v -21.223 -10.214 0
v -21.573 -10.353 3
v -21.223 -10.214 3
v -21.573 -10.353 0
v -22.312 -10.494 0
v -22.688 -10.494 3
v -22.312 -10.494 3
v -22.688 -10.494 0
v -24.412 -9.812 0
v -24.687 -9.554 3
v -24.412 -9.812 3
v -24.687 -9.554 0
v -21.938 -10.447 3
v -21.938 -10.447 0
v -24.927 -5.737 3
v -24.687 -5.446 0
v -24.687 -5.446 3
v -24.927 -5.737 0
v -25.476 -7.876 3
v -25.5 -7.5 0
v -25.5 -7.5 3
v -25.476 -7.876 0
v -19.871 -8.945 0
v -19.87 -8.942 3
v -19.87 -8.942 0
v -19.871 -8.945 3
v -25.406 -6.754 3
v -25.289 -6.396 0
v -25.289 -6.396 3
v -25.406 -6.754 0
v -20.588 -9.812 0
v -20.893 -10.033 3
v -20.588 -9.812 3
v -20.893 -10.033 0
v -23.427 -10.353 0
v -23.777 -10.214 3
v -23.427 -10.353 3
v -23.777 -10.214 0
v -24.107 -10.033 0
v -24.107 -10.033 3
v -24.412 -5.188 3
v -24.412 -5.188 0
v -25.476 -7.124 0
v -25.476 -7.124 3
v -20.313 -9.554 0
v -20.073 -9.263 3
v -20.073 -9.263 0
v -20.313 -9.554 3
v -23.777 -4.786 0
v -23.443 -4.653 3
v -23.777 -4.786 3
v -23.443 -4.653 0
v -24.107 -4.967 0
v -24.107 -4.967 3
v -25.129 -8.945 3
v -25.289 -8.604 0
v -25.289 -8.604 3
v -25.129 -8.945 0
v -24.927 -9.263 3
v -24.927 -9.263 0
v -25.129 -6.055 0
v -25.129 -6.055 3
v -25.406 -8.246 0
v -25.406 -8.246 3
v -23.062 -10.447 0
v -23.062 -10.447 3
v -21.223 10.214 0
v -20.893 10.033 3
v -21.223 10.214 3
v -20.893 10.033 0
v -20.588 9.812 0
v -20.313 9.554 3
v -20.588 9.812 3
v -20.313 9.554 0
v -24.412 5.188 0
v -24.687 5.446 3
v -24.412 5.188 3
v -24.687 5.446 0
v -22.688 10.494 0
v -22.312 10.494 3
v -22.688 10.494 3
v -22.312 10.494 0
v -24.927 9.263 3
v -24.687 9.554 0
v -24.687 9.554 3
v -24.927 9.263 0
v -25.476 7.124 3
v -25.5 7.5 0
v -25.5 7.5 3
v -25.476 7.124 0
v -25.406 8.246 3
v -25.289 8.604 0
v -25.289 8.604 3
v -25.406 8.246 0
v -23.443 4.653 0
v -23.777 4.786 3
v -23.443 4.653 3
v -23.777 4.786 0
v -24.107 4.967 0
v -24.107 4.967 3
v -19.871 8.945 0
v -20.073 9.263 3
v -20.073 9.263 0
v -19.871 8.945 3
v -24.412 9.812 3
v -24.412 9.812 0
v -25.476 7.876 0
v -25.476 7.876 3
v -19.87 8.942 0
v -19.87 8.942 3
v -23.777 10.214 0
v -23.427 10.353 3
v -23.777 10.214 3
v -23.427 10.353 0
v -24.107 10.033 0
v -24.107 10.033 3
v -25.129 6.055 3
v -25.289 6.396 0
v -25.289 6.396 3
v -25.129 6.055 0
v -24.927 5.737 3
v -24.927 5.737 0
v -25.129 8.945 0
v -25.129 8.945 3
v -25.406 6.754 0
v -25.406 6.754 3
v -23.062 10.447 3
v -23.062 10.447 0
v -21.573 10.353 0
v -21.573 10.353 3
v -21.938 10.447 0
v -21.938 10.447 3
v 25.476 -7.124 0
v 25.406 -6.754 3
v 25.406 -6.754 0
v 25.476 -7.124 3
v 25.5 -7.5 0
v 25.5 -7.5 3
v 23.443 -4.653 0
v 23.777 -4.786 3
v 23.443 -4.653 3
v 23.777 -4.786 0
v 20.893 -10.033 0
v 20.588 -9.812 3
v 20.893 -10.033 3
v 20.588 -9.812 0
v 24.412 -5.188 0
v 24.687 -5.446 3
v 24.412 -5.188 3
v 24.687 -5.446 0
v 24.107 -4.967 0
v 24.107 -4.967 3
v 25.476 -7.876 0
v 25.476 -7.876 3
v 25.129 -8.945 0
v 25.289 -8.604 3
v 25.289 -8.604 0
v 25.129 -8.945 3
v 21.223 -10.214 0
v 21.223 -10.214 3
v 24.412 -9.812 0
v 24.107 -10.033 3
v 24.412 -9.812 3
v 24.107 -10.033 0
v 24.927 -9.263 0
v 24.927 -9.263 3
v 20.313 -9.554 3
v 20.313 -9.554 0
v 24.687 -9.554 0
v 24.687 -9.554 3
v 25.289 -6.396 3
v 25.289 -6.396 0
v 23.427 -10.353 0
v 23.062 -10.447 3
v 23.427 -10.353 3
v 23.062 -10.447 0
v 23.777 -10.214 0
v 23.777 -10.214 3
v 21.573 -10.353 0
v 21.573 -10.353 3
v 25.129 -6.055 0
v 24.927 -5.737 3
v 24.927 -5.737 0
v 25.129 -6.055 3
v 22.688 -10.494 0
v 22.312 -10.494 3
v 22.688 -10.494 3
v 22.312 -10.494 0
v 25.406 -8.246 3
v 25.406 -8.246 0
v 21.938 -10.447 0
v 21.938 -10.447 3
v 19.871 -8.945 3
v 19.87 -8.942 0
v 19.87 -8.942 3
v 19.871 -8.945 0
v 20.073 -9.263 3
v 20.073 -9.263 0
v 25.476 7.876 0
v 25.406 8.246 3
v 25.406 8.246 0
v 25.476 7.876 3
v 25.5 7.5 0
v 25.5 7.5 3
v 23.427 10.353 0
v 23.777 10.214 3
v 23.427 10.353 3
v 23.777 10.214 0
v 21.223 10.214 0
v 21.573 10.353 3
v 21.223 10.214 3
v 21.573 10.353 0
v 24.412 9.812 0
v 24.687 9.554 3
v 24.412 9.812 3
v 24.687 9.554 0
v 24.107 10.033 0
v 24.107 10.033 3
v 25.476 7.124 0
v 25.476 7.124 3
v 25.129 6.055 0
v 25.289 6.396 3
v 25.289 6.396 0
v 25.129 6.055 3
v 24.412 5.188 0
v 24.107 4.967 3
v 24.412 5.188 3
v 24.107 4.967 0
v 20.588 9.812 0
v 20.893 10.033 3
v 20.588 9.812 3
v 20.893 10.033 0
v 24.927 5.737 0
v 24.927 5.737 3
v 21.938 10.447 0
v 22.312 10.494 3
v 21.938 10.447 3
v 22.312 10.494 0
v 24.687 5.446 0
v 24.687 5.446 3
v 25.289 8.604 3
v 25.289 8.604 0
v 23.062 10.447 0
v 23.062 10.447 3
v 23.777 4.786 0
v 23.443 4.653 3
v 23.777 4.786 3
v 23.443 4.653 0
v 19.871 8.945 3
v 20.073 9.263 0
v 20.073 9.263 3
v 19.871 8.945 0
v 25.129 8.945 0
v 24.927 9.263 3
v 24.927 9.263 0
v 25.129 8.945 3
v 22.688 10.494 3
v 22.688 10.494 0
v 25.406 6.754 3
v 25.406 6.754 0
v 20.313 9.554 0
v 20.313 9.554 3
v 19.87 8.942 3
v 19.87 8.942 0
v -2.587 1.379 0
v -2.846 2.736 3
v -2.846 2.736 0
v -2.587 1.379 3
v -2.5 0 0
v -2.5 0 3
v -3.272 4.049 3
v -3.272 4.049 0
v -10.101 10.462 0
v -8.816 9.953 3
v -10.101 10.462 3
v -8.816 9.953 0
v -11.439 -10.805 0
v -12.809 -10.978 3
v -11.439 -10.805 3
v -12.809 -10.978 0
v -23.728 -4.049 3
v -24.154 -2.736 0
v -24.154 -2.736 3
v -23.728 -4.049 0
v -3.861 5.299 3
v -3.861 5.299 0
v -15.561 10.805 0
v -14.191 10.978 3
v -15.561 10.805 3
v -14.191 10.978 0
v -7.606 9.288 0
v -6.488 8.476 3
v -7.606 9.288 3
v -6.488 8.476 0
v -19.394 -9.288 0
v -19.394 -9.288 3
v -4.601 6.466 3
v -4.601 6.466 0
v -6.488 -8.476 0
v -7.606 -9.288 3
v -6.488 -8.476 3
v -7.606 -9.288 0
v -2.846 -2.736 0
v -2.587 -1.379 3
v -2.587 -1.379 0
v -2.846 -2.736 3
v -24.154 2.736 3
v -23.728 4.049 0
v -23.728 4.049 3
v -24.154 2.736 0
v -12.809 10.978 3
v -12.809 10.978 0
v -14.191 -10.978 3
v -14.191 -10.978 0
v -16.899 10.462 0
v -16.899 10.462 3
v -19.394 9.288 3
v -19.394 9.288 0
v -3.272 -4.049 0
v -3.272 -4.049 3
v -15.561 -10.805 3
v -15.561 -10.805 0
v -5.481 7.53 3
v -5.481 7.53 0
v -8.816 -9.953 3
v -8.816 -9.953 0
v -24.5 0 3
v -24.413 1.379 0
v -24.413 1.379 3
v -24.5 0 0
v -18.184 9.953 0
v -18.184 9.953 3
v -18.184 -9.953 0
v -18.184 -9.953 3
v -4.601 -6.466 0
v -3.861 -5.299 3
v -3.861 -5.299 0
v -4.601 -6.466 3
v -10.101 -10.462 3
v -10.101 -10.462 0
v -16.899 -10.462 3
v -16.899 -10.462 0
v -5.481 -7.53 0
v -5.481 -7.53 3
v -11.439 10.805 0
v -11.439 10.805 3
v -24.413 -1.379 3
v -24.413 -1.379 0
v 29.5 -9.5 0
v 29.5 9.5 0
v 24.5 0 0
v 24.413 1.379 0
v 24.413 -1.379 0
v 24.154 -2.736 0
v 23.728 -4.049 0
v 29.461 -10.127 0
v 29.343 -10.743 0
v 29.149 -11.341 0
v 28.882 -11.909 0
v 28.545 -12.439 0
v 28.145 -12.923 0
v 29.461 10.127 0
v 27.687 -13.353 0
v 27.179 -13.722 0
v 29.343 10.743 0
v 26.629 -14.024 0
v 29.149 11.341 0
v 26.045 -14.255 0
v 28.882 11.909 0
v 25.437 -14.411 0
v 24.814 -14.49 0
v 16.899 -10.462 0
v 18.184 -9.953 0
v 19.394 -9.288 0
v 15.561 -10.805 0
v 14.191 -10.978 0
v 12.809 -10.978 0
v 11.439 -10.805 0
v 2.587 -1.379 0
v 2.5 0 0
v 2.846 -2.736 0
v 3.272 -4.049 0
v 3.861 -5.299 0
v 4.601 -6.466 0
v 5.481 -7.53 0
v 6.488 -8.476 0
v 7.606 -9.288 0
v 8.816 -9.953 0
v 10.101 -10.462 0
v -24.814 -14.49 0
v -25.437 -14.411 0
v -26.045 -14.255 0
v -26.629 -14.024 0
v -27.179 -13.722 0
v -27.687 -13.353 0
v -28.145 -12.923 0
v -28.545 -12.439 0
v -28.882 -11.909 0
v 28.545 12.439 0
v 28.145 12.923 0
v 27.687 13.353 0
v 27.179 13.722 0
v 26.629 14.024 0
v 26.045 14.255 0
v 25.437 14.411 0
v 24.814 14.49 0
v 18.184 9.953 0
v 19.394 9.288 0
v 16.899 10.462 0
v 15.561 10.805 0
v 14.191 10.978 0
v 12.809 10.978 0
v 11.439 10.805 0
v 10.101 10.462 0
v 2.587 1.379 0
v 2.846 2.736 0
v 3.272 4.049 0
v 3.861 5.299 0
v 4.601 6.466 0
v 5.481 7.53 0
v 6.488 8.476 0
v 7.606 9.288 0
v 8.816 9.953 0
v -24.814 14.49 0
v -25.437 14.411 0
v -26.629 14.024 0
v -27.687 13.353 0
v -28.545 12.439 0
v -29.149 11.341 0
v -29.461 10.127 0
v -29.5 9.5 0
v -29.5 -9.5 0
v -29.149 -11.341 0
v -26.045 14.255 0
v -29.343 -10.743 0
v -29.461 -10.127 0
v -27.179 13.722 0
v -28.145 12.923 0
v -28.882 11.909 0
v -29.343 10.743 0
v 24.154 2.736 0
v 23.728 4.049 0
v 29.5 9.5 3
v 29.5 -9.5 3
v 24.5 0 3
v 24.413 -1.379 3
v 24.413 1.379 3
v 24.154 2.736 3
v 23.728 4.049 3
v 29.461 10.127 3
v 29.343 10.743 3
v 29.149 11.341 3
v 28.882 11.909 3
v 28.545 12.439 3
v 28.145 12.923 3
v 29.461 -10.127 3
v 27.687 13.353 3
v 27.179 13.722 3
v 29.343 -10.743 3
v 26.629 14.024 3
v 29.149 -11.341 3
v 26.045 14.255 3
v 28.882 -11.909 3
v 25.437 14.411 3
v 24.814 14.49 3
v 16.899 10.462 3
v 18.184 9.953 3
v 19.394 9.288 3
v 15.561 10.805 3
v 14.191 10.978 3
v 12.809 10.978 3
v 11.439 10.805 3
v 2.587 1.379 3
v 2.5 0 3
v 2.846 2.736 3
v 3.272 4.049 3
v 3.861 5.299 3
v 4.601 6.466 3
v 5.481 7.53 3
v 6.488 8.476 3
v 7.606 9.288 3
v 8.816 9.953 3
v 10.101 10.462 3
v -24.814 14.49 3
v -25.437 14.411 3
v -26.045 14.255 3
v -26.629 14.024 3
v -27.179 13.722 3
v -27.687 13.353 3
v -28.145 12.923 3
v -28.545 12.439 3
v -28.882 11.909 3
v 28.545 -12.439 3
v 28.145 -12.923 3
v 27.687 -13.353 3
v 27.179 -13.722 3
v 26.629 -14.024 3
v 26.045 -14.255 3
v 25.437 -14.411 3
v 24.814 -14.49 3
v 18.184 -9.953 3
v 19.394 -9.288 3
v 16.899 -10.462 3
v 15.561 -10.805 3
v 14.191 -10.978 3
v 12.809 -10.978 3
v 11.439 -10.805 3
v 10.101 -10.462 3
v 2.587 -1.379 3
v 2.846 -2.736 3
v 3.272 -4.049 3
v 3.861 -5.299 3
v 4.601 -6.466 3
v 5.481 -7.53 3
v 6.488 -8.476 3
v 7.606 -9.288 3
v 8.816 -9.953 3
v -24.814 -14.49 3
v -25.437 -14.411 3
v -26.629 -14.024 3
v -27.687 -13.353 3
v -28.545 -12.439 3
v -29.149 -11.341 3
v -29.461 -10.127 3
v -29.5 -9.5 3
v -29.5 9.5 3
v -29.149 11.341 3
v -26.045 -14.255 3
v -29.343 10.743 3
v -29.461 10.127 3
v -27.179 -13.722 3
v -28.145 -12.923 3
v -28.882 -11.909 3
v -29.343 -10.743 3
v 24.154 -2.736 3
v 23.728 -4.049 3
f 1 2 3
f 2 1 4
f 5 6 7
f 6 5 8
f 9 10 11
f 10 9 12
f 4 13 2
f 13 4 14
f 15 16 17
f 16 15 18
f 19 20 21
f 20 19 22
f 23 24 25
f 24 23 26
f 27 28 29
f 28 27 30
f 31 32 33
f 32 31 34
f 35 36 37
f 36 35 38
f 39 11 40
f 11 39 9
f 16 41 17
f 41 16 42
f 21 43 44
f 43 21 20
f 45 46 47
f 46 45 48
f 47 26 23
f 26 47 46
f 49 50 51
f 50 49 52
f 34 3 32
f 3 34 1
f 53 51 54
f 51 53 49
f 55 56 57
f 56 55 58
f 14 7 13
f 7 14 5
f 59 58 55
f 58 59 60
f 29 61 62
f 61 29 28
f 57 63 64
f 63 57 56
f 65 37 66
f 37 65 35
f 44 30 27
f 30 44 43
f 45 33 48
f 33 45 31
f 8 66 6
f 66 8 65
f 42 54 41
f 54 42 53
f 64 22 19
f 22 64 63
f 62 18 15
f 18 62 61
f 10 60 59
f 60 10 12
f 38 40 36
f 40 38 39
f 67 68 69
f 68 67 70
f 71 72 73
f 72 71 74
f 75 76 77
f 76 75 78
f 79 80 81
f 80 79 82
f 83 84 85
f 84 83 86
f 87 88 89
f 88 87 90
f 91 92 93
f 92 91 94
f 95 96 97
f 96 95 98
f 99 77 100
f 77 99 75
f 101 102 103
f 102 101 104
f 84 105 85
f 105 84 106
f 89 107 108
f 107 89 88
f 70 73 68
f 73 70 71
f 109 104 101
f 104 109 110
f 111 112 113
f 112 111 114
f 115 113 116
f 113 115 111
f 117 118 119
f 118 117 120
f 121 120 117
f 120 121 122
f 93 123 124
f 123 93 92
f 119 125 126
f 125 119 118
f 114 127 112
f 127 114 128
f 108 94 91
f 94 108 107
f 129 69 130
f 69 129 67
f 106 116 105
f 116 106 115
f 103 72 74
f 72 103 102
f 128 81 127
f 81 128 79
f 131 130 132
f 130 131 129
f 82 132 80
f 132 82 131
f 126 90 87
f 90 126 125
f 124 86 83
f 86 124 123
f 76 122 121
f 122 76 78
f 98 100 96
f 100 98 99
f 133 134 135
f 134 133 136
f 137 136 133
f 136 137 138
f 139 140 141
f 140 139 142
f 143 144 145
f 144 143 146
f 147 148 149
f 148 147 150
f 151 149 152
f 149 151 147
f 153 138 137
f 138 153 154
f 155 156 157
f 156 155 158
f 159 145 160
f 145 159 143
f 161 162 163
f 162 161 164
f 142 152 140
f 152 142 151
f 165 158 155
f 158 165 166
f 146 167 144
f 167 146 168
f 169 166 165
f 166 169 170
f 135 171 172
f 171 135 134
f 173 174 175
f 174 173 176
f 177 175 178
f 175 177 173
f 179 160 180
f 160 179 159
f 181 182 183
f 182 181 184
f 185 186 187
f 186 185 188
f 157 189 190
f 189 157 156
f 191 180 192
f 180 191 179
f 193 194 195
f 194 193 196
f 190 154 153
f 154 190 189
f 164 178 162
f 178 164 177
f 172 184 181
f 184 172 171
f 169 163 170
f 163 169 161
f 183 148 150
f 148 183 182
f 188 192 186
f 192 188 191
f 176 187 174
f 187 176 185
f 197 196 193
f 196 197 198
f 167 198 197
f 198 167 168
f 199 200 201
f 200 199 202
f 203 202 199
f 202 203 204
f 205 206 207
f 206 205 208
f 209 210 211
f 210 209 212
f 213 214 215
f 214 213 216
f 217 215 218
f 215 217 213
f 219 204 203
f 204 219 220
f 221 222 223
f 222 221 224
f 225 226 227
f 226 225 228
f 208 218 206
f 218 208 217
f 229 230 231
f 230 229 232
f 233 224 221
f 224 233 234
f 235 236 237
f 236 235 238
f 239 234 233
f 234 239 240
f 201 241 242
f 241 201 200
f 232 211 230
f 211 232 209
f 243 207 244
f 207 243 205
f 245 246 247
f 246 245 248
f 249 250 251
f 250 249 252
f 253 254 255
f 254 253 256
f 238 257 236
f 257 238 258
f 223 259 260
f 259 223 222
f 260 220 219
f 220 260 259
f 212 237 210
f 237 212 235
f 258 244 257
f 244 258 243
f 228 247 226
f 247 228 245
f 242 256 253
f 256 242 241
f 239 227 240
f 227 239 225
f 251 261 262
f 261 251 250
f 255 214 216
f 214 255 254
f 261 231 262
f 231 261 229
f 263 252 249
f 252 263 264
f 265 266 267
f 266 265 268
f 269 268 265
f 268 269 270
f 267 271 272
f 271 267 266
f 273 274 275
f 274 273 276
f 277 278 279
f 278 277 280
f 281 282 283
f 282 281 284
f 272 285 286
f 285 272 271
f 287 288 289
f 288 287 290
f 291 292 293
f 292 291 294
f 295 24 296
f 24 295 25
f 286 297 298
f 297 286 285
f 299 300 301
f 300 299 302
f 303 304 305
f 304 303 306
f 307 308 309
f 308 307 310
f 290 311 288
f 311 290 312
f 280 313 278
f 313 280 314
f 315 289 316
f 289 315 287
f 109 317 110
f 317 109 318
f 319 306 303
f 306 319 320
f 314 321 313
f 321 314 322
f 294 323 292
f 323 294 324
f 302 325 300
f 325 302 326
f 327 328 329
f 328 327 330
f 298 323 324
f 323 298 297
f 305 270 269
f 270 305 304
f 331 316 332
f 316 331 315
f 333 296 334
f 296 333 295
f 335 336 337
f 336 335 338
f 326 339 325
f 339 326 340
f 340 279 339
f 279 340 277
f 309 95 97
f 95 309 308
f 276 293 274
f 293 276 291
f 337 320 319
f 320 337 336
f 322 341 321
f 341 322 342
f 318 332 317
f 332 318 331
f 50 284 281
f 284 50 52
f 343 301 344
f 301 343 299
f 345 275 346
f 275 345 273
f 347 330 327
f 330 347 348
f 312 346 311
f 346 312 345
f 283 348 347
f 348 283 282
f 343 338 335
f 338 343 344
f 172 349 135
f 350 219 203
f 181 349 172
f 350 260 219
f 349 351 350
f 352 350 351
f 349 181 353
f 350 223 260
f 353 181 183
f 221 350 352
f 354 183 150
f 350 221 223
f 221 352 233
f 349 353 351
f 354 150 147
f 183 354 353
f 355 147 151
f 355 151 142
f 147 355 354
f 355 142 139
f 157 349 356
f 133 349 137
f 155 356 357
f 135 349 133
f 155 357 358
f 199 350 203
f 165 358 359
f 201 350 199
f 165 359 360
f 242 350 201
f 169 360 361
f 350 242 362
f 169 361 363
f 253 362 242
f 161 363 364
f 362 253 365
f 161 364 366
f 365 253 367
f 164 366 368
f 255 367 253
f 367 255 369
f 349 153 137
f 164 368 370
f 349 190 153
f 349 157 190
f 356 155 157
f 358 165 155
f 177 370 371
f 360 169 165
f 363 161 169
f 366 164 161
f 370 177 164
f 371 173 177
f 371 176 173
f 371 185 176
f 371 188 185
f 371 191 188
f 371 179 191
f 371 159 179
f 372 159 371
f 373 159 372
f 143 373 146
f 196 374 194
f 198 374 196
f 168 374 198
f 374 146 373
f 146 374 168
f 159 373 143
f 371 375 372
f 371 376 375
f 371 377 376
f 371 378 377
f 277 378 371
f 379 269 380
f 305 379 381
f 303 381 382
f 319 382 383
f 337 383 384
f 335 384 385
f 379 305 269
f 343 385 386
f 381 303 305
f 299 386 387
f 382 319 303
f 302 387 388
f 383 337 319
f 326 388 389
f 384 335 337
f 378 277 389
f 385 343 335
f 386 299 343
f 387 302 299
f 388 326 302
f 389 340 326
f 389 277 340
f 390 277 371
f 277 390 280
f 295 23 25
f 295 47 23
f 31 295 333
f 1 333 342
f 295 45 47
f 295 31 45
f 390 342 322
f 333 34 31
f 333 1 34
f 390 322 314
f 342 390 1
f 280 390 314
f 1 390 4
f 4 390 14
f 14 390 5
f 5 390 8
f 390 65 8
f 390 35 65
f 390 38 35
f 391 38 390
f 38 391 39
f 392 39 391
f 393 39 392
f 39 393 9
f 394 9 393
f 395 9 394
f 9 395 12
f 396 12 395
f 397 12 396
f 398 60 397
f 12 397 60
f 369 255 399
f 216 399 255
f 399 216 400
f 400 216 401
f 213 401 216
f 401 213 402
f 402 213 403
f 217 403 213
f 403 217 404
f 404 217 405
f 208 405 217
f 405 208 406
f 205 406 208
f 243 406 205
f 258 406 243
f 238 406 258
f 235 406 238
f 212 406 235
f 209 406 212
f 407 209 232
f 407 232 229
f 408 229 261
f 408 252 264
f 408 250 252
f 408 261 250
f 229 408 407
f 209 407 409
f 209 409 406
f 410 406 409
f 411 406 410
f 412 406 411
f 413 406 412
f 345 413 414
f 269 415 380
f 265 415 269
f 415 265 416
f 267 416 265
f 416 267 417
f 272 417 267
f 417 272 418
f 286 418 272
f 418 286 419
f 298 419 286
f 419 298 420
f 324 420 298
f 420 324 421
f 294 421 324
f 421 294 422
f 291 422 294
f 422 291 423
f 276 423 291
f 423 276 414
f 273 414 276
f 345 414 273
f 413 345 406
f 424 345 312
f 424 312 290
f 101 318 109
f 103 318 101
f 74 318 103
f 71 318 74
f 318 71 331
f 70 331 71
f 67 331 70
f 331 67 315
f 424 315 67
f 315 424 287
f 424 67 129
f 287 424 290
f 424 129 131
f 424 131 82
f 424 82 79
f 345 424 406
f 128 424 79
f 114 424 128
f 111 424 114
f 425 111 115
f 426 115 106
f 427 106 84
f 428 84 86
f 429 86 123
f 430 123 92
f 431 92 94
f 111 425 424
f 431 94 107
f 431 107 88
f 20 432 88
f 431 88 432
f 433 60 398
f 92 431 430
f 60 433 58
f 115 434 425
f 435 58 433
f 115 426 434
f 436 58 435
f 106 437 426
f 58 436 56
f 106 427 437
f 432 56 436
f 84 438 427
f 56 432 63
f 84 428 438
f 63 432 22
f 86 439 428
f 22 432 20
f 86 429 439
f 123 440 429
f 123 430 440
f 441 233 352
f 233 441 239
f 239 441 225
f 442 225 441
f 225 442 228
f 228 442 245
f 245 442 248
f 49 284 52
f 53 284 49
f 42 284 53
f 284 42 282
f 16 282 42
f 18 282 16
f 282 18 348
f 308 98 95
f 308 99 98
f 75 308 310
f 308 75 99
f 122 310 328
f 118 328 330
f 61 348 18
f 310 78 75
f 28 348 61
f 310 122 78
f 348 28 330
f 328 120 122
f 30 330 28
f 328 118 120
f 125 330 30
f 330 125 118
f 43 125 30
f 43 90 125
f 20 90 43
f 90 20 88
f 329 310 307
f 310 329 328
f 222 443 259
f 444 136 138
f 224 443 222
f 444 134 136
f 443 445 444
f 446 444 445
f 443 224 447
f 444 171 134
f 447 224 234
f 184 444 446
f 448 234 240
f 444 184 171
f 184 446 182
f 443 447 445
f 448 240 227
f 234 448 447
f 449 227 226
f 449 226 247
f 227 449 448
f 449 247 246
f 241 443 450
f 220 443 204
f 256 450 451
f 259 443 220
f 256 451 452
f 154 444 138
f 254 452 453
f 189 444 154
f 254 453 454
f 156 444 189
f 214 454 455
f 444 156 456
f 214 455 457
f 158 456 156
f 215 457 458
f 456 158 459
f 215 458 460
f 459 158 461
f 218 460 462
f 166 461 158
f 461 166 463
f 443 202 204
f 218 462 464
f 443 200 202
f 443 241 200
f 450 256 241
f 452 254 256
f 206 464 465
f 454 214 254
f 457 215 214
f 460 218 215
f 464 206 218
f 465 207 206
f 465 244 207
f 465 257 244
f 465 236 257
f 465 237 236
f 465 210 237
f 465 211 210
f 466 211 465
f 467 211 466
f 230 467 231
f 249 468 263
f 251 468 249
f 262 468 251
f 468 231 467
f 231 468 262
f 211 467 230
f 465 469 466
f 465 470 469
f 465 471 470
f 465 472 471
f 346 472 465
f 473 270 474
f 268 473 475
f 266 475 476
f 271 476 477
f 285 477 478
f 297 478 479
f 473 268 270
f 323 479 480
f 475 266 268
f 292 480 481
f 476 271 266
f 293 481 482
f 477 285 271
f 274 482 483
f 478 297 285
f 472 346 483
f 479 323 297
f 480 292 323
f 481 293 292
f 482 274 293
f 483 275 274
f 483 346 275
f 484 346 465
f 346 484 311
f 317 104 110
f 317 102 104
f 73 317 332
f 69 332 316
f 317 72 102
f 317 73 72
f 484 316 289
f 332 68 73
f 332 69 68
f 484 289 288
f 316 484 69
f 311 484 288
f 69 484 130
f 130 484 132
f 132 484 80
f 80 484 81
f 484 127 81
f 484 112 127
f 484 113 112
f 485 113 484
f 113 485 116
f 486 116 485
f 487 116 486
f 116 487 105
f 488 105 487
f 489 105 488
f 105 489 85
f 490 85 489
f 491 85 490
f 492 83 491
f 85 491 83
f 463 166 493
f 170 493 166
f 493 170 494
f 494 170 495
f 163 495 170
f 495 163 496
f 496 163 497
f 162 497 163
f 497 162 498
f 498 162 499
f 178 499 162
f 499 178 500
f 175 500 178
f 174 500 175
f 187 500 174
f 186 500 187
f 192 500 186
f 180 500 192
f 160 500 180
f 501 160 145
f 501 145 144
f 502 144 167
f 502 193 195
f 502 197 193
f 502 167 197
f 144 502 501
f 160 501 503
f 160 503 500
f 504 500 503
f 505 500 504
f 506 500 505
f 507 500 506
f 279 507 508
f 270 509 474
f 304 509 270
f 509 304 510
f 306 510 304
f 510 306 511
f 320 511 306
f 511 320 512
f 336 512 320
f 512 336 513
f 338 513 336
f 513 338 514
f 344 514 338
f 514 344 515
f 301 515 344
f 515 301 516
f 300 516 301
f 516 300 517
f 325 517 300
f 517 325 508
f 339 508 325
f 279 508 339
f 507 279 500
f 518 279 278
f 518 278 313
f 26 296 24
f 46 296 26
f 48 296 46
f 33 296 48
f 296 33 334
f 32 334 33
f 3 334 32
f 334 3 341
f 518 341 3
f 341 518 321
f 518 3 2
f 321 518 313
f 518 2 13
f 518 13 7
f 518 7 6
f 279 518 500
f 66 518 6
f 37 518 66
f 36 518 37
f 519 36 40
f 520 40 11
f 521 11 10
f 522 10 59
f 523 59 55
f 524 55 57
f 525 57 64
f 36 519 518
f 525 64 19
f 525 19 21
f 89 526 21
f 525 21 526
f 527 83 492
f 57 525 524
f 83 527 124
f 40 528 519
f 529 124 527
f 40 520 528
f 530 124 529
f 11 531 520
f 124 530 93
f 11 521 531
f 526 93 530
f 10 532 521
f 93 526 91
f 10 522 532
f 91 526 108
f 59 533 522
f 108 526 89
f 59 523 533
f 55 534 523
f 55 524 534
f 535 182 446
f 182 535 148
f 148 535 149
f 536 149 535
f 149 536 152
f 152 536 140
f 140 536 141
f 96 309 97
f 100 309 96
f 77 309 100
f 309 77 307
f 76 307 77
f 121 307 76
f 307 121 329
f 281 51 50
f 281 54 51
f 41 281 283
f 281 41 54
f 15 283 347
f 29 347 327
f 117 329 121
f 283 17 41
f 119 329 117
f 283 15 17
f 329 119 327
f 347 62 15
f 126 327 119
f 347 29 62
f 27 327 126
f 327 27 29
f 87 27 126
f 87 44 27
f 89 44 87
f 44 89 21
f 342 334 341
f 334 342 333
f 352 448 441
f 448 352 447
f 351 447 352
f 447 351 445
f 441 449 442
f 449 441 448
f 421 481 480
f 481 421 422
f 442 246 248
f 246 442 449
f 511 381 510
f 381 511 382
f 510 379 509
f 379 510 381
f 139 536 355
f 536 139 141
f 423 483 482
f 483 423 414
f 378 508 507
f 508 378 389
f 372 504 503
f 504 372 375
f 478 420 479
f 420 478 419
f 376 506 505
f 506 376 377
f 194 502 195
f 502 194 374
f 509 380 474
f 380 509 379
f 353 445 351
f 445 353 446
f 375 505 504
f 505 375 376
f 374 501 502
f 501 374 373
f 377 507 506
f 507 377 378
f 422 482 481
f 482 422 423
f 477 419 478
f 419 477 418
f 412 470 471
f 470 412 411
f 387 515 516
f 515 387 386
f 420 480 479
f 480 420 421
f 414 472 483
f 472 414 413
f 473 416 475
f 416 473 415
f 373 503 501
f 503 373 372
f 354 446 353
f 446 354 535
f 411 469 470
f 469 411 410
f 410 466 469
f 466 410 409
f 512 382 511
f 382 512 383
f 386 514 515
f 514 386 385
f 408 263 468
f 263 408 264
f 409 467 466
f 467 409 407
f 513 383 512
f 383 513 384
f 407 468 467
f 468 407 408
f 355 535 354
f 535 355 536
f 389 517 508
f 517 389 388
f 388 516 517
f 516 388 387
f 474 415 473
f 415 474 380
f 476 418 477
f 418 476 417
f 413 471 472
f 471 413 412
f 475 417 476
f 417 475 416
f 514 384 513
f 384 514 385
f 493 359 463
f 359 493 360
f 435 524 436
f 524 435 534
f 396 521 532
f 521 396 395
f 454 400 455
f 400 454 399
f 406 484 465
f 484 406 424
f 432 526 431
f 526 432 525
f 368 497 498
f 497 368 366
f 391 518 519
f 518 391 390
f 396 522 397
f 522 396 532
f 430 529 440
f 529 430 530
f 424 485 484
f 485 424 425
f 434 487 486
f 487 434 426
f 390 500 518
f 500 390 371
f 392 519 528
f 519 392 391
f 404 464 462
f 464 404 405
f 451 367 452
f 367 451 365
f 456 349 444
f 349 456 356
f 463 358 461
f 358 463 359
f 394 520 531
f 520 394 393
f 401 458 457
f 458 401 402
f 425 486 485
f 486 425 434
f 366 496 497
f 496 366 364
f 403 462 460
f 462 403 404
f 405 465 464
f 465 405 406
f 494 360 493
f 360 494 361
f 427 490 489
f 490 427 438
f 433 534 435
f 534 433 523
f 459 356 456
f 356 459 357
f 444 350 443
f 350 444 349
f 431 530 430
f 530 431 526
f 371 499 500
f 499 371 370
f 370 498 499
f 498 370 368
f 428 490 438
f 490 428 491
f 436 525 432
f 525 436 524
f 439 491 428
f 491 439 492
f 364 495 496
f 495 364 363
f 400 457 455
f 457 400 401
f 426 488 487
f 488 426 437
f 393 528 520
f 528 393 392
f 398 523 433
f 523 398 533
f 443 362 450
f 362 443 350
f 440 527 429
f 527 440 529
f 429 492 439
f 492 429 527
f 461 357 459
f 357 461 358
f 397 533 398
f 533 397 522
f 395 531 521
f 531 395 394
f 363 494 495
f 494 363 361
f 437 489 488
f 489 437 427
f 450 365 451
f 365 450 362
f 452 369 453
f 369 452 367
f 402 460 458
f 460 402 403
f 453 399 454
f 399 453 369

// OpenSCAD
$fn = 50;


difference() {
	union() {
		hull() {
			translate(v = [-24.5000000000, 9.5000000000, 0]) {
				cylinder(h = 3, r = 5);
			}
			translate(v = [24.5000000000, 9.5000000000, 0]) {
				cylinder(h = 3, r = 5);
			}
			translate(v = [-24.5000000000, -9.5000000000, 0]) {
				cylinder(h = 3, r = 5);
			}
			translate(v = [24.5000000000, -9.5000000000, 0]) {
				cylinder(h = 3, r = 5);
			}
		}
	}
	union() {
		#translate(v = [-22.5000000000, -7.5000000000, -100.0000000000]) {
			cylinder(h = 200, r = 3.0000000000);
		}
		#translate(v = [-22.5000000000, 7.5000000000, -100.0000000000]) {
			cylinder(h = 200, r = 3.0000000000);
		}
		#translate(v = [22.5000000000, -7.5000000000, -100.0000000000]) {
			cylinder(h = 200, r = 3.0000000000);
		}
		#translate(v = [22.5000000000, 7.5000000000, -100.0000000000]) {
			cylinder(h = 200, r = 3.0000000000);
		}
		#translate(v = [-13.5000000000, 0, 0]) {
			cylinder(h = 3, r = 11.0000000000);
		}
		#translate(v = [13.5000000000, 0, 0]) {
			cylinder(h = 3, r = 11.0000000000);
		}
	}
}
